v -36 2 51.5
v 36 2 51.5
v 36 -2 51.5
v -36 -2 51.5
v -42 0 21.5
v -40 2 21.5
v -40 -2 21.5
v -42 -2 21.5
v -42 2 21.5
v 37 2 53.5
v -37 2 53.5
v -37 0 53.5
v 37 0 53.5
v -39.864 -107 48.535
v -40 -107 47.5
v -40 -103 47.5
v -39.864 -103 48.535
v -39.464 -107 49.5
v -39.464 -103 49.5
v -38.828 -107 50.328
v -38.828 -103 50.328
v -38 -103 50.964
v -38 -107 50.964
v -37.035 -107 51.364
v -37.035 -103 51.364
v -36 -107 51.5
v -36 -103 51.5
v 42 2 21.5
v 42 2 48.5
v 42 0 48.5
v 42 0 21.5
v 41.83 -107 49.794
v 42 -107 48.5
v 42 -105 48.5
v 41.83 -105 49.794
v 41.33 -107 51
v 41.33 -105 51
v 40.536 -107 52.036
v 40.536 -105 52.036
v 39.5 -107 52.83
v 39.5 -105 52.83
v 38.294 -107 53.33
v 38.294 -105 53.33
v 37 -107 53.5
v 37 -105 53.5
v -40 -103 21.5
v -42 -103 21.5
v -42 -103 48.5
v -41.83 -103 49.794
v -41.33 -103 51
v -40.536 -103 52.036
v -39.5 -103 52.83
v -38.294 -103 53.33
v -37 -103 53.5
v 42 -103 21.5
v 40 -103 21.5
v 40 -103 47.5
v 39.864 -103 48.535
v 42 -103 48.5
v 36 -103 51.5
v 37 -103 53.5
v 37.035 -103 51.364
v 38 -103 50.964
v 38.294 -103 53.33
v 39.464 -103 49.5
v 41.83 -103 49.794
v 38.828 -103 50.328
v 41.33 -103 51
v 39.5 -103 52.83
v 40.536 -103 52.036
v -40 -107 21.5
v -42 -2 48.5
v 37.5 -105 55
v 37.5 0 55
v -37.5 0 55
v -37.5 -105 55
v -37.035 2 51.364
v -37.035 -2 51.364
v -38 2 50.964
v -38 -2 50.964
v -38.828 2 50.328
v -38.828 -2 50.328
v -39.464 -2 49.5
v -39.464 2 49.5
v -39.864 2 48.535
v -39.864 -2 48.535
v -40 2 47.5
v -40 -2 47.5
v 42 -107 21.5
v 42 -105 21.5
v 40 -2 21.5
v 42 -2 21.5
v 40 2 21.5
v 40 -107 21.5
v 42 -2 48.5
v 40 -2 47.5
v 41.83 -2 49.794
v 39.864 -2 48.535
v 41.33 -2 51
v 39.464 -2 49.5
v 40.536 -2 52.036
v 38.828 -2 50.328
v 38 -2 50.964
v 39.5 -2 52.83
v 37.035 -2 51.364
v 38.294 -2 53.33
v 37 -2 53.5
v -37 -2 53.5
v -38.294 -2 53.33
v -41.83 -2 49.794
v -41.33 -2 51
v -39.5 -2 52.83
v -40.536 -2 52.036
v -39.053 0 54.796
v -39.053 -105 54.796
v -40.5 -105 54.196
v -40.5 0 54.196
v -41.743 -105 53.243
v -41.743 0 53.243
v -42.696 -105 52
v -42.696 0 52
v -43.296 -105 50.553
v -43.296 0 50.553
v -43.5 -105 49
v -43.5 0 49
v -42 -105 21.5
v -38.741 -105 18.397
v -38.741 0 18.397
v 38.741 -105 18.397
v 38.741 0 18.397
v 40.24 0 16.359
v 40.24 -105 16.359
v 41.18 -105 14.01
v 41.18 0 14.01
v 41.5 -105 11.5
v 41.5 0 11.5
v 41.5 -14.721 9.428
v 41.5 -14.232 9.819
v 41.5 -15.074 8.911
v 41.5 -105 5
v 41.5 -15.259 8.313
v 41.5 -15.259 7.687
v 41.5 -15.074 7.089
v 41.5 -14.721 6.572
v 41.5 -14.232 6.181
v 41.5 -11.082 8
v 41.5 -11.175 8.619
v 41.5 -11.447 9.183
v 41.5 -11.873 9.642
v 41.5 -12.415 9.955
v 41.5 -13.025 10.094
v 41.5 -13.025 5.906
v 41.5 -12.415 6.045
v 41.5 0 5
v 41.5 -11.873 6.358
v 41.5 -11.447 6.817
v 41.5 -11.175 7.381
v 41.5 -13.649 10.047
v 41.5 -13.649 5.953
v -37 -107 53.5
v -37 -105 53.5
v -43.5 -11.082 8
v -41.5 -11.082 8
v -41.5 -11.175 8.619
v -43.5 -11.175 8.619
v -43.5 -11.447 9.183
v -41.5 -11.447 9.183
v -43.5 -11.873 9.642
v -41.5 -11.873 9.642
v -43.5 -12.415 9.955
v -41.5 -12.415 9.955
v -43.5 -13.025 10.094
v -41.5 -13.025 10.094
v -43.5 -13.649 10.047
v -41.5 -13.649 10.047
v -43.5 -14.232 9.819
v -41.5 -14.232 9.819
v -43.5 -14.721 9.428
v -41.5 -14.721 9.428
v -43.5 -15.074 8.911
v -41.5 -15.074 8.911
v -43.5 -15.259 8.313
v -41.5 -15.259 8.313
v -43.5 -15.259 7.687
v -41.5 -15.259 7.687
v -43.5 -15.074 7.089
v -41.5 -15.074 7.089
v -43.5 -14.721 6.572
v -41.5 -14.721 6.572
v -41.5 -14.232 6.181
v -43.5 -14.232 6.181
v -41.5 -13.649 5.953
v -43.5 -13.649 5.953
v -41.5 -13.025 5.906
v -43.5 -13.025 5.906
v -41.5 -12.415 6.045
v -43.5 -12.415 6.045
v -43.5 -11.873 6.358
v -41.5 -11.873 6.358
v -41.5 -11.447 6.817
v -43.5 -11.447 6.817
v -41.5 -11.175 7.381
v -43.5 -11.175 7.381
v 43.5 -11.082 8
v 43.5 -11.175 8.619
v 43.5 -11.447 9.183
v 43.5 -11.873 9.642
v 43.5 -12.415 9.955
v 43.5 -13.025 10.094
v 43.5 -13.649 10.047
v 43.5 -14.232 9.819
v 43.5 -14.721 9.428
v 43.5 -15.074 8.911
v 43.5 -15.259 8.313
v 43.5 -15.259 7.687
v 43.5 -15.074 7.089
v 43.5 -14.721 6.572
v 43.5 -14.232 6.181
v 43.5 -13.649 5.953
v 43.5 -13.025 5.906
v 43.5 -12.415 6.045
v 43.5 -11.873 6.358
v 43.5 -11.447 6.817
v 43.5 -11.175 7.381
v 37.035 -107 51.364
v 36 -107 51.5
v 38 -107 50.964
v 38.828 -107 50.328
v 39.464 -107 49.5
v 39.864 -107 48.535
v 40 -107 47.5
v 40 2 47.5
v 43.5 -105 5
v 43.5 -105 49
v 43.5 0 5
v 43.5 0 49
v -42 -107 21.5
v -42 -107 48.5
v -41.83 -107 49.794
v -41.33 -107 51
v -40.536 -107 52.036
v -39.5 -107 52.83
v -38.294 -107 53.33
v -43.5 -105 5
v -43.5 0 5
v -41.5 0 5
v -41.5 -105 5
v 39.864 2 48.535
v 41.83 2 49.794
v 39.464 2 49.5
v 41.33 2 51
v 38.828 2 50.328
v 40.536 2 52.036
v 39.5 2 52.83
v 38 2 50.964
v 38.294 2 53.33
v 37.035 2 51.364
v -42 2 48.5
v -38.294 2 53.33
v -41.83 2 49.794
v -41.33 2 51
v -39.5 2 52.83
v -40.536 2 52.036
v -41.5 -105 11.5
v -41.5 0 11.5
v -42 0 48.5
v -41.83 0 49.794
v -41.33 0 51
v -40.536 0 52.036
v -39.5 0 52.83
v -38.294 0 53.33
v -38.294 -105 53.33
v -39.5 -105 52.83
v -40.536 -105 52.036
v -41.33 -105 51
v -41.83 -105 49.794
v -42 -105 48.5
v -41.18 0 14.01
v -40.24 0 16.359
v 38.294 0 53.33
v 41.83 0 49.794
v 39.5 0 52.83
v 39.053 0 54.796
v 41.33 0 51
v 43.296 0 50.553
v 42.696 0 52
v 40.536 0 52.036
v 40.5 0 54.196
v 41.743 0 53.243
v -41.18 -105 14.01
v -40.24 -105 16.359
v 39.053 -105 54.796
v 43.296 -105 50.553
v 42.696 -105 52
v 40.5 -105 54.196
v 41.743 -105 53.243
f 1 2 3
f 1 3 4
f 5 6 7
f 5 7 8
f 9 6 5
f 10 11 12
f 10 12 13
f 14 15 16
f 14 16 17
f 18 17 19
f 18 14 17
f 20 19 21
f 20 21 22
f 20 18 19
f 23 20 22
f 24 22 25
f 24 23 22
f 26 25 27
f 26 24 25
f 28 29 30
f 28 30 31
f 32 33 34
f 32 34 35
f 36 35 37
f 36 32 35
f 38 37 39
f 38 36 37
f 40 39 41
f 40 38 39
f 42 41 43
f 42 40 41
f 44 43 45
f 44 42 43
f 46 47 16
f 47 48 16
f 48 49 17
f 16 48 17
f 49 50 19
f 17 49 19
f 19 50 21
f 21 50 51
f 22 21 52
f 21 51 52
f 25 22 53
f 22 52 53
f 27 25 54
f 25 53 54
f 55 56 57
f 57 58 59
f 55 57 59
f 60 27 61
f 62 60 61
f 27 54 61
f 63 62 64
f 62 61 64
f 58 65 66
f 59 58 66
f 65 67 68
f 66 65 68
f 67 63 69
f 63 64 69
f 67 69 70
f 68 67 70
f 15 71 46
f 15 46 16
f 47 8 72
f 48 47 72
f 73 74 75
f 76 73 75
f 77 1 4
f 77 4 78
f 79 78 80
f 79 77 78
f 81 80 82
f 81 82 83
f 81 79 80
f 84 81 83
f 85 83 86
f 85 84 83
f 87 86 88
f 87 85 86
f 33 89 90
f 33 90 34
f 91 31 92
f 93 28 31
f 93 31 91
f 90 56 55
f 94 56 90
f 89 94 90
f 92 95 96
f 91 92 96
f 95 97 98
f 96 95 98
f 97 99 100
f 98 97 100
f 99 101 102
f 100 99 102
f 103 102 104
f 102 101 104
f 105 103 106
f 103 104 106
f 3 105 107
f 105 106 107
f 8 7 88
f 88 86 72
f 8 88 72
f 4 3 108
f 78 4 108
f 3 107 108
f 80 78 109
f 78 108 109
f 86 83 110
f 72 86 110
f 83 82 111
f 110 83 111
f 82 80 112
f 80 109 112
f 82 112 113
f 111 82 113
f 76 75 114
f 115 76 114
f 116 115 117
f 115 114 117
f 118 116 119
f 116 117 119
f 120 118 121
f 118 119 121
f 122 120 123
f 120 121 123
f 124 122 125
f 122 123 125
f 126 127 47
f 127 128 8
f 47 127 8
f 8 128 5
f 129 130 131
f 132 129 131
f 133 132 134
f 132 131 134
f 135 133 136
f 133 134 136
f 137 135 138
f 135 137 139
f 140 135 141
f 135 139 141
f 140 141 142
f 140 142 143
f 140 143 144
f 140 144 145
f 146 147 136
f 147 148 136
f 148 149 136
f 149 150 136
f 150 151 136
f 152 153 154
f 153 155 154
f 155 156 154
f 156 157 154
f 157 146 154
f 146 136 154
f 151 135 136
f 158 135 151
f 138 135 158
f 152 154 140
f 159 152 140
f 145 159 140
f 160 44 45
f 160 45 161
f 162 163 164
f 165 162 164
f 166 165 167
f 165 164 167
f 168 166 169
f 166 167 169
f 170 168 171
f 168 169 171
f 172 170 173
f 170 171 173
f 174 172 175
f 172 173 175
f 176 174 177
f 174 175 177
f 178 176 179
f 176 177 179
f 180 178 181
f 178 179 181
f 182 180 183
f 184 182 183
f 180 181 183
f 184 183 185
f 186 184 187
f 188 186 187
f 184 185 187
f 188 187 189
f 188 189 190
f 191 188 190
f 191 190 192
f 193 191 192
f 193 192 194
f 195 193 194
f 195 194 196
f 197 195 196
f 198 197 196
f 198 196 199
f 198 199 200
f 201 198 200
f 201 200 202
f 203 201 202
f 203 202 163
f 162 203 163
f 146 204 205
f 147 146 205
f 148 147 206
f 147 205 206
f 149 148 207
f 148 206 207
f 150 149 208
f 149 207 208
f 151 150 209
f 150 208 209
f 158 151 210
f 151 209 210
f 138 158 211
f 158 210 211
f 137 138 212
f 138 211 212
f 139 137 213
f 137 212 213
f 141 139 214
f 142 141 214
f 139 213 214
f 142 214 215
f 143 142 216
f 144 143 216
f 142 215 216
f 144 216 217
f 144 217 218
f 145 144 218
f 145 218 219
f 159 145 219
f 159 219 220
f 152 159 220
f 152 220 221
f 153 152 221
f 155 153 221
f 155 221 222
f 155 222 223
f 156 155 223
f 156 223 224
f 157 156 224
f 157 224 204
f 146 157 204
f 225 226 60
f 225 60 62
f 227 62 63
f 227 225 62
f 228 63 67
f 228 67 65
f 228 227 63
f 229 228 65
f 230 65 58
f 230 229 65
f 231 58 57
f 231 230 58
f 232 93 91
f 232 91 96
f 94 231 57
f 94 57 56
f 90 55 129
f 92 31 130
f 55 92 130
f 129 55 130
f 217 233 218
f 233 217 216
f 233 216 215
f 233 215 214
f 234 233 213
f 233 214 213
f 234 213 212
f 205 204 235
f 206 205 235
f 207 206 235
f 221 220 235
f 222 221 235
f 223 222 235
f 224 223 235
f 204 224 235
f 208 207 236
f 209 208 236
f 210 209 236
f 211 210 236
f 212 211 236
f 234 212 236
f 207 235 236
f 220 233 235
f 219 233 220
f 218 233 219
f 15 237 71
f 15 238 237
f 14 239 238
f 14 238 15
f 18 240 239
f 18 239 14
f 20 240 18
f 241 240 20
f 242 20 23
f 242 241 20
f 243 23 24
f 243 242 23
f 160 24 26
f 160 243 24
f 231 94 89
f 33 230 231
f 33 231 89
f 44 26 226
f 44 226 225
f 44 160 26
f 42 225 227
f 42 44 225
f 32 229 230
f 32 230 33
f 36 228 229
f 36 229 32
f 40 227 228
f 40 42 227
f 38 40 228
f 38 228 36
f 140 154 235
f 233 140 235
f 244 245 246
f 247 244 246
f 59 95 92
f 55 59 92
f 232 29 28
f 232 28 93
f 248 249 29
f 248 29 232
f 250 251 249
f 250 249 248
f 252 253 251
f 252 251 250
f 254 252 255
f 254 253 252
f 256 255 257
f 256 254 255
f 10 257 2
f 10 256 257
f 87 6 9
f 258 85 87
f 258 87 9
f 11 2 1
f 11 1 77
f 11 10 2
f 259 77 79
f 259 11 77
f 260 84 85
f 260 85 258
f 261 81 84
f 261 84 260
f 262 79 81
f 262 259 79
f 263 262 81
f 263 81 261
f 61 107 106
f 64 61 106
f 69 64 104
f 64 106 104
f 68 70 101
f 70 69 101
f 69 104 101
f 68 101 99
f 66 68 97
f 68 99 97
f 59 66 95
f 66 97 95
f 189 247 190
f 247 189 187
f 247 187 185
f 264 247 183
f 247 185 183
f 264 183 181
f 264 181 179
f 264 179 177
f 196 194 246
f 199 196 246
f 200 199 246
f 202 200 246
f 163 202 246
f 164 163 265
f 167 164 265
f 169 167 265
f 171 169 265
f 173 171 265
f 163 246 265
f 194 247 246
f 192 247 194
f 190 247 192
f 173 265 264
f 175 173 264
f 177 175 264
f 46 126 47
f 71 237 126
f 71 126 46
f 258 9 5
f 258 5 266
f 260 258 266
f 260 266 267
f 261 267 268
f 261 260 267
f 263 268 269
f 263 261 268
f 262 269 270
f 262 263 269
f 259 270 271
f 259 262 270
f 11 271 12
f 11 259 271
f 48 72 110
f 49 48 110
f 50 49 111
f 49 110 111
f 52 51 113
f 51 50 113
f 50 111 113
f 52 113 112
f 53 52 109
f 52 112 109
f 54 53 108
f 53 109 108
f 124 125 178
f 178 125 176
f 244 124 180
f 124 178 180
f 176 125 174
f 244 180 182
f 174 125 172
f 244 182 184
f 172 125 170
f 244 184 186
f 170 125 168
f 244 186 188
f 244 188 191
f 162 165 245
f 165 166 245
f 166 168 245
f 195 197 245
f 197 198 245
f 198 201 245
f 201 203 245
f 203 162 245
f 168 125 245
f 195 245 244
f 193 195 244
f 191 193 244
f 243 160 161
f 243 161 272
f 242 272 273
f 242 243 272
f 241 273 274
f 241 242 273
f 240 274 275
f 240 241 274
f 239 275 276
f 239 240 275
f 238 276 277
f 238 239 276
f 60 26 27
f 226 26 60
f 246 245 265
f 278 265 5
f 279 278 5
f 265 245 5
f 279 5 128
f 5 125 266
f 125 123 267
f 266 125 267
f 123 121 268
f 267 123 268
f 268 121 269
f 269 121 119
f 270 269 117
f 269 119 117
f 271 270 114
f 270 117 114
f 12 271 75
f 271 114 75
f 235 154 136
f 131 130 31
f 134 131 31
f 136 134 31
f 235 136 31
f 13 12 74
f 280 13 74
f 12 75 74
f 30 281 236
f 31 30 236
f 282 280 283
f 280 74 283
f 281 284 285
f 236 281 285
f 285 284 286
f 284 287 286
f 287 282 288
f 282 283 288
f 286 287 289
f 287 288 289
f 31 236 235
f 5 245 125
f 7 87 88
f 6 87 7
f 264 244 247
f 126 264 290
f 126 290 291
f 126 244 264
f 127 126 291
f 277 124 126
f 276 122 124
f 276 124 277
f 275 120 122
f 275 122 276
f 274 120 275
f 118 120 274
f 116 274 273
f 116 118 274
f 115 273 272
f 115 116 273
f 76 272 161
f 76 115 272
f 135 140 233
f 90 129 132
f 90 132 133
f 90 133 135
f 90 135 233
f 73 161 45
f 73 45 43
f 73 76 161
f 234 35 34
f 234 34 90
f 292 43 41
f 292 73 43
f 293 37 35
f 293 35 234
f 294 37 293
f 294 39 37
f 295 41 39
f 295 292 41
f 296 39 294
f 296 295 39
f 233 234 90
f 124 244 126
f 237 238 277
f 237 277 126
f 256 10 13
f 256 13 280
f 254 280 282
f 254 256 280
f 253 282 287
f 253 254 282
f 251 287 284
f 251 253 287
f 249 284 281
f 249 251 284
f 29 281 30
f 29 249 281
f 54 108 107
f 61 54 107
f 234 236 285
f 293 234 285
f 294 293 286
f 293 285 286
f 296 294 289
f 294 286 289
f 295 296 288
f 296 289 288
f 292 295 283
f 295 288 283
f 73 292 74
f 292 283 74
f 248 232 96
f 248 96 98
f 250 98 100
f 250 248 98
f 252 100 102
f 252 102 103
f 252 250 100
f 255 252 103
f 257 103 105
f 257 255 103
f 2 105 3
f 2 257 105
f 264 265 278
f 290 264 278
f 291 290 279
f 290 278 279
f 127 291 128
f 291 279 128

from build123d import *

# Parameters (mm, degrees)
F1_DEPTH = 105
F2_R     = 2.1
F3_DEPTH = 87.001
F6_DEPTH = 2
F8_DEPTH = 2


with BuildPart() as f1:
    # F0 (on Front) → F1 (new body)
    with BuildSketch(Plane.XZ):
        with BuildLine():
            ThreePointArc((-41.5, 11.5), (-40.784767, 15.213907), (-38.741379, 18.396552))
            Line((-38.741379, 18.396552), (-42, 21.5))
            Line((-42, 21.5), (-42, 48.5))
            ThreePointArc((-42, 48.5), (-40.535534, 52.035534), (-37, 53.5))
            Line((-37, 53.5), (37, 53.5))
            ThreePointArc((37, 53.5), (40.535534, 52.035534), (42, 48.5))
            Line((42, 48.5), (42, 21.5))
            Line((42, 21.5), (38.741379, 18.396552))
            ThreePointArc((38.741379, 18.396552), (40.784767, 15.213907), (41.5, 11.5))
            Line((41.5, 11.5), (41.5, 5))
            Line((41.5, 5), (43.5, 5))
            Line((43.5, 5), (43.5, 49))
            ThreePointArc((43.5, 49), (41.742641, 53.242641), (37.5, 55))
            Line((37.5, 55), (-37.5, 55))
            ThreePointArc((-37.5, 55), (-41.742641, 53.242641), (-43.5, 49))
            Line((-43.5, 49), (-43.5, 5))
            Line((-43.5, 5), (-41.5, 5))
            Line((-41.5, 5), (-41.5, 11.5))
        make_face()
    extrude(amount=F1_DEPTH)

    # F2 (on face) → F3 (cut, through all)
    with BuildSketch(Plane.YZ.offset(43.5)):
        with Locations((-13.182085, 8)):
            Circle(F2_R)
    extrude(amount=-F3_DEPTH, mode=Mode.SUBTRACT)

    # F5 (on face) → F6 (join, symmetric)
    with BuildSketch(Plane.XZ.offset(105)):
        with BuildLine():
            Line((-42, 21.5), (-40, 21.5))
            Line((-40, 21.5), (-40, 47.5))
            ThreePointArc((-40, 47.5), (-38.828427, 50.328427), (-36, 51.5))
            Line((-36, 51.5), (36, 51.5))
            ThreePointArc((36, 51.5), (38.828427, 50.328427), (40, 47.5))
            Line((40, 47.5), (40, 21.5))
            Line((40, 21.5), (42, 21.5))
            Line((42, 21.5), (42, 48.5))
            ThreePointArc((42, 48.5), (40.535534, 52.035534), (37, 53.5))
            Line((37, 53.5), (-37, 53.5))
            ThreePointArc((-37, 53.5), (-40.535534, 52.035534), (-42, 48.5))
            Line((-42, 48.5), (-42, 21.5))
        make_face()
    extrude(amount=F6_DEPTH, both=True)

    # F7 (on face) → F8 (join, symmetric)
    with BuildSketch(Plane(origin=(0, 0, 0), x_dir=(-1, 0, 0), z_dir=(0, 1, 0))):
        with BuildLine():
            Line((-42, 48.5), (-42, 21.5))
            Line((-42, 21.5), (-40, 21.5))
            Line((-40, 21.5), (-40, 47.5))
            ThreePointArc((-40, 47.5), (-38.828427, 50.328427), (-36, 51.5))
            Line((-36, 51.5), (36, 51.5))
            ThreePointArc((36, 51.5), (38.828427, 50.328427), (40, 47.5))
            Line((40, 47.5), (40, 21.5))
            Line((40, 21.5), (42, 21.5))
            Line((42, 21.5), (42, 48.5))
            ThreePointArc((42, 48.5), (40.535534, 52.035534), (37, 53.5))
            Line((37, 53.5), (-37, 53.5))
            ThreePointArc((-37, 53.5), (-40.535534, 52.035534), (-42, 48.5))
        make_face()
    extrude(amount=F8_DEPTH, both=True)


solid = f1.part
